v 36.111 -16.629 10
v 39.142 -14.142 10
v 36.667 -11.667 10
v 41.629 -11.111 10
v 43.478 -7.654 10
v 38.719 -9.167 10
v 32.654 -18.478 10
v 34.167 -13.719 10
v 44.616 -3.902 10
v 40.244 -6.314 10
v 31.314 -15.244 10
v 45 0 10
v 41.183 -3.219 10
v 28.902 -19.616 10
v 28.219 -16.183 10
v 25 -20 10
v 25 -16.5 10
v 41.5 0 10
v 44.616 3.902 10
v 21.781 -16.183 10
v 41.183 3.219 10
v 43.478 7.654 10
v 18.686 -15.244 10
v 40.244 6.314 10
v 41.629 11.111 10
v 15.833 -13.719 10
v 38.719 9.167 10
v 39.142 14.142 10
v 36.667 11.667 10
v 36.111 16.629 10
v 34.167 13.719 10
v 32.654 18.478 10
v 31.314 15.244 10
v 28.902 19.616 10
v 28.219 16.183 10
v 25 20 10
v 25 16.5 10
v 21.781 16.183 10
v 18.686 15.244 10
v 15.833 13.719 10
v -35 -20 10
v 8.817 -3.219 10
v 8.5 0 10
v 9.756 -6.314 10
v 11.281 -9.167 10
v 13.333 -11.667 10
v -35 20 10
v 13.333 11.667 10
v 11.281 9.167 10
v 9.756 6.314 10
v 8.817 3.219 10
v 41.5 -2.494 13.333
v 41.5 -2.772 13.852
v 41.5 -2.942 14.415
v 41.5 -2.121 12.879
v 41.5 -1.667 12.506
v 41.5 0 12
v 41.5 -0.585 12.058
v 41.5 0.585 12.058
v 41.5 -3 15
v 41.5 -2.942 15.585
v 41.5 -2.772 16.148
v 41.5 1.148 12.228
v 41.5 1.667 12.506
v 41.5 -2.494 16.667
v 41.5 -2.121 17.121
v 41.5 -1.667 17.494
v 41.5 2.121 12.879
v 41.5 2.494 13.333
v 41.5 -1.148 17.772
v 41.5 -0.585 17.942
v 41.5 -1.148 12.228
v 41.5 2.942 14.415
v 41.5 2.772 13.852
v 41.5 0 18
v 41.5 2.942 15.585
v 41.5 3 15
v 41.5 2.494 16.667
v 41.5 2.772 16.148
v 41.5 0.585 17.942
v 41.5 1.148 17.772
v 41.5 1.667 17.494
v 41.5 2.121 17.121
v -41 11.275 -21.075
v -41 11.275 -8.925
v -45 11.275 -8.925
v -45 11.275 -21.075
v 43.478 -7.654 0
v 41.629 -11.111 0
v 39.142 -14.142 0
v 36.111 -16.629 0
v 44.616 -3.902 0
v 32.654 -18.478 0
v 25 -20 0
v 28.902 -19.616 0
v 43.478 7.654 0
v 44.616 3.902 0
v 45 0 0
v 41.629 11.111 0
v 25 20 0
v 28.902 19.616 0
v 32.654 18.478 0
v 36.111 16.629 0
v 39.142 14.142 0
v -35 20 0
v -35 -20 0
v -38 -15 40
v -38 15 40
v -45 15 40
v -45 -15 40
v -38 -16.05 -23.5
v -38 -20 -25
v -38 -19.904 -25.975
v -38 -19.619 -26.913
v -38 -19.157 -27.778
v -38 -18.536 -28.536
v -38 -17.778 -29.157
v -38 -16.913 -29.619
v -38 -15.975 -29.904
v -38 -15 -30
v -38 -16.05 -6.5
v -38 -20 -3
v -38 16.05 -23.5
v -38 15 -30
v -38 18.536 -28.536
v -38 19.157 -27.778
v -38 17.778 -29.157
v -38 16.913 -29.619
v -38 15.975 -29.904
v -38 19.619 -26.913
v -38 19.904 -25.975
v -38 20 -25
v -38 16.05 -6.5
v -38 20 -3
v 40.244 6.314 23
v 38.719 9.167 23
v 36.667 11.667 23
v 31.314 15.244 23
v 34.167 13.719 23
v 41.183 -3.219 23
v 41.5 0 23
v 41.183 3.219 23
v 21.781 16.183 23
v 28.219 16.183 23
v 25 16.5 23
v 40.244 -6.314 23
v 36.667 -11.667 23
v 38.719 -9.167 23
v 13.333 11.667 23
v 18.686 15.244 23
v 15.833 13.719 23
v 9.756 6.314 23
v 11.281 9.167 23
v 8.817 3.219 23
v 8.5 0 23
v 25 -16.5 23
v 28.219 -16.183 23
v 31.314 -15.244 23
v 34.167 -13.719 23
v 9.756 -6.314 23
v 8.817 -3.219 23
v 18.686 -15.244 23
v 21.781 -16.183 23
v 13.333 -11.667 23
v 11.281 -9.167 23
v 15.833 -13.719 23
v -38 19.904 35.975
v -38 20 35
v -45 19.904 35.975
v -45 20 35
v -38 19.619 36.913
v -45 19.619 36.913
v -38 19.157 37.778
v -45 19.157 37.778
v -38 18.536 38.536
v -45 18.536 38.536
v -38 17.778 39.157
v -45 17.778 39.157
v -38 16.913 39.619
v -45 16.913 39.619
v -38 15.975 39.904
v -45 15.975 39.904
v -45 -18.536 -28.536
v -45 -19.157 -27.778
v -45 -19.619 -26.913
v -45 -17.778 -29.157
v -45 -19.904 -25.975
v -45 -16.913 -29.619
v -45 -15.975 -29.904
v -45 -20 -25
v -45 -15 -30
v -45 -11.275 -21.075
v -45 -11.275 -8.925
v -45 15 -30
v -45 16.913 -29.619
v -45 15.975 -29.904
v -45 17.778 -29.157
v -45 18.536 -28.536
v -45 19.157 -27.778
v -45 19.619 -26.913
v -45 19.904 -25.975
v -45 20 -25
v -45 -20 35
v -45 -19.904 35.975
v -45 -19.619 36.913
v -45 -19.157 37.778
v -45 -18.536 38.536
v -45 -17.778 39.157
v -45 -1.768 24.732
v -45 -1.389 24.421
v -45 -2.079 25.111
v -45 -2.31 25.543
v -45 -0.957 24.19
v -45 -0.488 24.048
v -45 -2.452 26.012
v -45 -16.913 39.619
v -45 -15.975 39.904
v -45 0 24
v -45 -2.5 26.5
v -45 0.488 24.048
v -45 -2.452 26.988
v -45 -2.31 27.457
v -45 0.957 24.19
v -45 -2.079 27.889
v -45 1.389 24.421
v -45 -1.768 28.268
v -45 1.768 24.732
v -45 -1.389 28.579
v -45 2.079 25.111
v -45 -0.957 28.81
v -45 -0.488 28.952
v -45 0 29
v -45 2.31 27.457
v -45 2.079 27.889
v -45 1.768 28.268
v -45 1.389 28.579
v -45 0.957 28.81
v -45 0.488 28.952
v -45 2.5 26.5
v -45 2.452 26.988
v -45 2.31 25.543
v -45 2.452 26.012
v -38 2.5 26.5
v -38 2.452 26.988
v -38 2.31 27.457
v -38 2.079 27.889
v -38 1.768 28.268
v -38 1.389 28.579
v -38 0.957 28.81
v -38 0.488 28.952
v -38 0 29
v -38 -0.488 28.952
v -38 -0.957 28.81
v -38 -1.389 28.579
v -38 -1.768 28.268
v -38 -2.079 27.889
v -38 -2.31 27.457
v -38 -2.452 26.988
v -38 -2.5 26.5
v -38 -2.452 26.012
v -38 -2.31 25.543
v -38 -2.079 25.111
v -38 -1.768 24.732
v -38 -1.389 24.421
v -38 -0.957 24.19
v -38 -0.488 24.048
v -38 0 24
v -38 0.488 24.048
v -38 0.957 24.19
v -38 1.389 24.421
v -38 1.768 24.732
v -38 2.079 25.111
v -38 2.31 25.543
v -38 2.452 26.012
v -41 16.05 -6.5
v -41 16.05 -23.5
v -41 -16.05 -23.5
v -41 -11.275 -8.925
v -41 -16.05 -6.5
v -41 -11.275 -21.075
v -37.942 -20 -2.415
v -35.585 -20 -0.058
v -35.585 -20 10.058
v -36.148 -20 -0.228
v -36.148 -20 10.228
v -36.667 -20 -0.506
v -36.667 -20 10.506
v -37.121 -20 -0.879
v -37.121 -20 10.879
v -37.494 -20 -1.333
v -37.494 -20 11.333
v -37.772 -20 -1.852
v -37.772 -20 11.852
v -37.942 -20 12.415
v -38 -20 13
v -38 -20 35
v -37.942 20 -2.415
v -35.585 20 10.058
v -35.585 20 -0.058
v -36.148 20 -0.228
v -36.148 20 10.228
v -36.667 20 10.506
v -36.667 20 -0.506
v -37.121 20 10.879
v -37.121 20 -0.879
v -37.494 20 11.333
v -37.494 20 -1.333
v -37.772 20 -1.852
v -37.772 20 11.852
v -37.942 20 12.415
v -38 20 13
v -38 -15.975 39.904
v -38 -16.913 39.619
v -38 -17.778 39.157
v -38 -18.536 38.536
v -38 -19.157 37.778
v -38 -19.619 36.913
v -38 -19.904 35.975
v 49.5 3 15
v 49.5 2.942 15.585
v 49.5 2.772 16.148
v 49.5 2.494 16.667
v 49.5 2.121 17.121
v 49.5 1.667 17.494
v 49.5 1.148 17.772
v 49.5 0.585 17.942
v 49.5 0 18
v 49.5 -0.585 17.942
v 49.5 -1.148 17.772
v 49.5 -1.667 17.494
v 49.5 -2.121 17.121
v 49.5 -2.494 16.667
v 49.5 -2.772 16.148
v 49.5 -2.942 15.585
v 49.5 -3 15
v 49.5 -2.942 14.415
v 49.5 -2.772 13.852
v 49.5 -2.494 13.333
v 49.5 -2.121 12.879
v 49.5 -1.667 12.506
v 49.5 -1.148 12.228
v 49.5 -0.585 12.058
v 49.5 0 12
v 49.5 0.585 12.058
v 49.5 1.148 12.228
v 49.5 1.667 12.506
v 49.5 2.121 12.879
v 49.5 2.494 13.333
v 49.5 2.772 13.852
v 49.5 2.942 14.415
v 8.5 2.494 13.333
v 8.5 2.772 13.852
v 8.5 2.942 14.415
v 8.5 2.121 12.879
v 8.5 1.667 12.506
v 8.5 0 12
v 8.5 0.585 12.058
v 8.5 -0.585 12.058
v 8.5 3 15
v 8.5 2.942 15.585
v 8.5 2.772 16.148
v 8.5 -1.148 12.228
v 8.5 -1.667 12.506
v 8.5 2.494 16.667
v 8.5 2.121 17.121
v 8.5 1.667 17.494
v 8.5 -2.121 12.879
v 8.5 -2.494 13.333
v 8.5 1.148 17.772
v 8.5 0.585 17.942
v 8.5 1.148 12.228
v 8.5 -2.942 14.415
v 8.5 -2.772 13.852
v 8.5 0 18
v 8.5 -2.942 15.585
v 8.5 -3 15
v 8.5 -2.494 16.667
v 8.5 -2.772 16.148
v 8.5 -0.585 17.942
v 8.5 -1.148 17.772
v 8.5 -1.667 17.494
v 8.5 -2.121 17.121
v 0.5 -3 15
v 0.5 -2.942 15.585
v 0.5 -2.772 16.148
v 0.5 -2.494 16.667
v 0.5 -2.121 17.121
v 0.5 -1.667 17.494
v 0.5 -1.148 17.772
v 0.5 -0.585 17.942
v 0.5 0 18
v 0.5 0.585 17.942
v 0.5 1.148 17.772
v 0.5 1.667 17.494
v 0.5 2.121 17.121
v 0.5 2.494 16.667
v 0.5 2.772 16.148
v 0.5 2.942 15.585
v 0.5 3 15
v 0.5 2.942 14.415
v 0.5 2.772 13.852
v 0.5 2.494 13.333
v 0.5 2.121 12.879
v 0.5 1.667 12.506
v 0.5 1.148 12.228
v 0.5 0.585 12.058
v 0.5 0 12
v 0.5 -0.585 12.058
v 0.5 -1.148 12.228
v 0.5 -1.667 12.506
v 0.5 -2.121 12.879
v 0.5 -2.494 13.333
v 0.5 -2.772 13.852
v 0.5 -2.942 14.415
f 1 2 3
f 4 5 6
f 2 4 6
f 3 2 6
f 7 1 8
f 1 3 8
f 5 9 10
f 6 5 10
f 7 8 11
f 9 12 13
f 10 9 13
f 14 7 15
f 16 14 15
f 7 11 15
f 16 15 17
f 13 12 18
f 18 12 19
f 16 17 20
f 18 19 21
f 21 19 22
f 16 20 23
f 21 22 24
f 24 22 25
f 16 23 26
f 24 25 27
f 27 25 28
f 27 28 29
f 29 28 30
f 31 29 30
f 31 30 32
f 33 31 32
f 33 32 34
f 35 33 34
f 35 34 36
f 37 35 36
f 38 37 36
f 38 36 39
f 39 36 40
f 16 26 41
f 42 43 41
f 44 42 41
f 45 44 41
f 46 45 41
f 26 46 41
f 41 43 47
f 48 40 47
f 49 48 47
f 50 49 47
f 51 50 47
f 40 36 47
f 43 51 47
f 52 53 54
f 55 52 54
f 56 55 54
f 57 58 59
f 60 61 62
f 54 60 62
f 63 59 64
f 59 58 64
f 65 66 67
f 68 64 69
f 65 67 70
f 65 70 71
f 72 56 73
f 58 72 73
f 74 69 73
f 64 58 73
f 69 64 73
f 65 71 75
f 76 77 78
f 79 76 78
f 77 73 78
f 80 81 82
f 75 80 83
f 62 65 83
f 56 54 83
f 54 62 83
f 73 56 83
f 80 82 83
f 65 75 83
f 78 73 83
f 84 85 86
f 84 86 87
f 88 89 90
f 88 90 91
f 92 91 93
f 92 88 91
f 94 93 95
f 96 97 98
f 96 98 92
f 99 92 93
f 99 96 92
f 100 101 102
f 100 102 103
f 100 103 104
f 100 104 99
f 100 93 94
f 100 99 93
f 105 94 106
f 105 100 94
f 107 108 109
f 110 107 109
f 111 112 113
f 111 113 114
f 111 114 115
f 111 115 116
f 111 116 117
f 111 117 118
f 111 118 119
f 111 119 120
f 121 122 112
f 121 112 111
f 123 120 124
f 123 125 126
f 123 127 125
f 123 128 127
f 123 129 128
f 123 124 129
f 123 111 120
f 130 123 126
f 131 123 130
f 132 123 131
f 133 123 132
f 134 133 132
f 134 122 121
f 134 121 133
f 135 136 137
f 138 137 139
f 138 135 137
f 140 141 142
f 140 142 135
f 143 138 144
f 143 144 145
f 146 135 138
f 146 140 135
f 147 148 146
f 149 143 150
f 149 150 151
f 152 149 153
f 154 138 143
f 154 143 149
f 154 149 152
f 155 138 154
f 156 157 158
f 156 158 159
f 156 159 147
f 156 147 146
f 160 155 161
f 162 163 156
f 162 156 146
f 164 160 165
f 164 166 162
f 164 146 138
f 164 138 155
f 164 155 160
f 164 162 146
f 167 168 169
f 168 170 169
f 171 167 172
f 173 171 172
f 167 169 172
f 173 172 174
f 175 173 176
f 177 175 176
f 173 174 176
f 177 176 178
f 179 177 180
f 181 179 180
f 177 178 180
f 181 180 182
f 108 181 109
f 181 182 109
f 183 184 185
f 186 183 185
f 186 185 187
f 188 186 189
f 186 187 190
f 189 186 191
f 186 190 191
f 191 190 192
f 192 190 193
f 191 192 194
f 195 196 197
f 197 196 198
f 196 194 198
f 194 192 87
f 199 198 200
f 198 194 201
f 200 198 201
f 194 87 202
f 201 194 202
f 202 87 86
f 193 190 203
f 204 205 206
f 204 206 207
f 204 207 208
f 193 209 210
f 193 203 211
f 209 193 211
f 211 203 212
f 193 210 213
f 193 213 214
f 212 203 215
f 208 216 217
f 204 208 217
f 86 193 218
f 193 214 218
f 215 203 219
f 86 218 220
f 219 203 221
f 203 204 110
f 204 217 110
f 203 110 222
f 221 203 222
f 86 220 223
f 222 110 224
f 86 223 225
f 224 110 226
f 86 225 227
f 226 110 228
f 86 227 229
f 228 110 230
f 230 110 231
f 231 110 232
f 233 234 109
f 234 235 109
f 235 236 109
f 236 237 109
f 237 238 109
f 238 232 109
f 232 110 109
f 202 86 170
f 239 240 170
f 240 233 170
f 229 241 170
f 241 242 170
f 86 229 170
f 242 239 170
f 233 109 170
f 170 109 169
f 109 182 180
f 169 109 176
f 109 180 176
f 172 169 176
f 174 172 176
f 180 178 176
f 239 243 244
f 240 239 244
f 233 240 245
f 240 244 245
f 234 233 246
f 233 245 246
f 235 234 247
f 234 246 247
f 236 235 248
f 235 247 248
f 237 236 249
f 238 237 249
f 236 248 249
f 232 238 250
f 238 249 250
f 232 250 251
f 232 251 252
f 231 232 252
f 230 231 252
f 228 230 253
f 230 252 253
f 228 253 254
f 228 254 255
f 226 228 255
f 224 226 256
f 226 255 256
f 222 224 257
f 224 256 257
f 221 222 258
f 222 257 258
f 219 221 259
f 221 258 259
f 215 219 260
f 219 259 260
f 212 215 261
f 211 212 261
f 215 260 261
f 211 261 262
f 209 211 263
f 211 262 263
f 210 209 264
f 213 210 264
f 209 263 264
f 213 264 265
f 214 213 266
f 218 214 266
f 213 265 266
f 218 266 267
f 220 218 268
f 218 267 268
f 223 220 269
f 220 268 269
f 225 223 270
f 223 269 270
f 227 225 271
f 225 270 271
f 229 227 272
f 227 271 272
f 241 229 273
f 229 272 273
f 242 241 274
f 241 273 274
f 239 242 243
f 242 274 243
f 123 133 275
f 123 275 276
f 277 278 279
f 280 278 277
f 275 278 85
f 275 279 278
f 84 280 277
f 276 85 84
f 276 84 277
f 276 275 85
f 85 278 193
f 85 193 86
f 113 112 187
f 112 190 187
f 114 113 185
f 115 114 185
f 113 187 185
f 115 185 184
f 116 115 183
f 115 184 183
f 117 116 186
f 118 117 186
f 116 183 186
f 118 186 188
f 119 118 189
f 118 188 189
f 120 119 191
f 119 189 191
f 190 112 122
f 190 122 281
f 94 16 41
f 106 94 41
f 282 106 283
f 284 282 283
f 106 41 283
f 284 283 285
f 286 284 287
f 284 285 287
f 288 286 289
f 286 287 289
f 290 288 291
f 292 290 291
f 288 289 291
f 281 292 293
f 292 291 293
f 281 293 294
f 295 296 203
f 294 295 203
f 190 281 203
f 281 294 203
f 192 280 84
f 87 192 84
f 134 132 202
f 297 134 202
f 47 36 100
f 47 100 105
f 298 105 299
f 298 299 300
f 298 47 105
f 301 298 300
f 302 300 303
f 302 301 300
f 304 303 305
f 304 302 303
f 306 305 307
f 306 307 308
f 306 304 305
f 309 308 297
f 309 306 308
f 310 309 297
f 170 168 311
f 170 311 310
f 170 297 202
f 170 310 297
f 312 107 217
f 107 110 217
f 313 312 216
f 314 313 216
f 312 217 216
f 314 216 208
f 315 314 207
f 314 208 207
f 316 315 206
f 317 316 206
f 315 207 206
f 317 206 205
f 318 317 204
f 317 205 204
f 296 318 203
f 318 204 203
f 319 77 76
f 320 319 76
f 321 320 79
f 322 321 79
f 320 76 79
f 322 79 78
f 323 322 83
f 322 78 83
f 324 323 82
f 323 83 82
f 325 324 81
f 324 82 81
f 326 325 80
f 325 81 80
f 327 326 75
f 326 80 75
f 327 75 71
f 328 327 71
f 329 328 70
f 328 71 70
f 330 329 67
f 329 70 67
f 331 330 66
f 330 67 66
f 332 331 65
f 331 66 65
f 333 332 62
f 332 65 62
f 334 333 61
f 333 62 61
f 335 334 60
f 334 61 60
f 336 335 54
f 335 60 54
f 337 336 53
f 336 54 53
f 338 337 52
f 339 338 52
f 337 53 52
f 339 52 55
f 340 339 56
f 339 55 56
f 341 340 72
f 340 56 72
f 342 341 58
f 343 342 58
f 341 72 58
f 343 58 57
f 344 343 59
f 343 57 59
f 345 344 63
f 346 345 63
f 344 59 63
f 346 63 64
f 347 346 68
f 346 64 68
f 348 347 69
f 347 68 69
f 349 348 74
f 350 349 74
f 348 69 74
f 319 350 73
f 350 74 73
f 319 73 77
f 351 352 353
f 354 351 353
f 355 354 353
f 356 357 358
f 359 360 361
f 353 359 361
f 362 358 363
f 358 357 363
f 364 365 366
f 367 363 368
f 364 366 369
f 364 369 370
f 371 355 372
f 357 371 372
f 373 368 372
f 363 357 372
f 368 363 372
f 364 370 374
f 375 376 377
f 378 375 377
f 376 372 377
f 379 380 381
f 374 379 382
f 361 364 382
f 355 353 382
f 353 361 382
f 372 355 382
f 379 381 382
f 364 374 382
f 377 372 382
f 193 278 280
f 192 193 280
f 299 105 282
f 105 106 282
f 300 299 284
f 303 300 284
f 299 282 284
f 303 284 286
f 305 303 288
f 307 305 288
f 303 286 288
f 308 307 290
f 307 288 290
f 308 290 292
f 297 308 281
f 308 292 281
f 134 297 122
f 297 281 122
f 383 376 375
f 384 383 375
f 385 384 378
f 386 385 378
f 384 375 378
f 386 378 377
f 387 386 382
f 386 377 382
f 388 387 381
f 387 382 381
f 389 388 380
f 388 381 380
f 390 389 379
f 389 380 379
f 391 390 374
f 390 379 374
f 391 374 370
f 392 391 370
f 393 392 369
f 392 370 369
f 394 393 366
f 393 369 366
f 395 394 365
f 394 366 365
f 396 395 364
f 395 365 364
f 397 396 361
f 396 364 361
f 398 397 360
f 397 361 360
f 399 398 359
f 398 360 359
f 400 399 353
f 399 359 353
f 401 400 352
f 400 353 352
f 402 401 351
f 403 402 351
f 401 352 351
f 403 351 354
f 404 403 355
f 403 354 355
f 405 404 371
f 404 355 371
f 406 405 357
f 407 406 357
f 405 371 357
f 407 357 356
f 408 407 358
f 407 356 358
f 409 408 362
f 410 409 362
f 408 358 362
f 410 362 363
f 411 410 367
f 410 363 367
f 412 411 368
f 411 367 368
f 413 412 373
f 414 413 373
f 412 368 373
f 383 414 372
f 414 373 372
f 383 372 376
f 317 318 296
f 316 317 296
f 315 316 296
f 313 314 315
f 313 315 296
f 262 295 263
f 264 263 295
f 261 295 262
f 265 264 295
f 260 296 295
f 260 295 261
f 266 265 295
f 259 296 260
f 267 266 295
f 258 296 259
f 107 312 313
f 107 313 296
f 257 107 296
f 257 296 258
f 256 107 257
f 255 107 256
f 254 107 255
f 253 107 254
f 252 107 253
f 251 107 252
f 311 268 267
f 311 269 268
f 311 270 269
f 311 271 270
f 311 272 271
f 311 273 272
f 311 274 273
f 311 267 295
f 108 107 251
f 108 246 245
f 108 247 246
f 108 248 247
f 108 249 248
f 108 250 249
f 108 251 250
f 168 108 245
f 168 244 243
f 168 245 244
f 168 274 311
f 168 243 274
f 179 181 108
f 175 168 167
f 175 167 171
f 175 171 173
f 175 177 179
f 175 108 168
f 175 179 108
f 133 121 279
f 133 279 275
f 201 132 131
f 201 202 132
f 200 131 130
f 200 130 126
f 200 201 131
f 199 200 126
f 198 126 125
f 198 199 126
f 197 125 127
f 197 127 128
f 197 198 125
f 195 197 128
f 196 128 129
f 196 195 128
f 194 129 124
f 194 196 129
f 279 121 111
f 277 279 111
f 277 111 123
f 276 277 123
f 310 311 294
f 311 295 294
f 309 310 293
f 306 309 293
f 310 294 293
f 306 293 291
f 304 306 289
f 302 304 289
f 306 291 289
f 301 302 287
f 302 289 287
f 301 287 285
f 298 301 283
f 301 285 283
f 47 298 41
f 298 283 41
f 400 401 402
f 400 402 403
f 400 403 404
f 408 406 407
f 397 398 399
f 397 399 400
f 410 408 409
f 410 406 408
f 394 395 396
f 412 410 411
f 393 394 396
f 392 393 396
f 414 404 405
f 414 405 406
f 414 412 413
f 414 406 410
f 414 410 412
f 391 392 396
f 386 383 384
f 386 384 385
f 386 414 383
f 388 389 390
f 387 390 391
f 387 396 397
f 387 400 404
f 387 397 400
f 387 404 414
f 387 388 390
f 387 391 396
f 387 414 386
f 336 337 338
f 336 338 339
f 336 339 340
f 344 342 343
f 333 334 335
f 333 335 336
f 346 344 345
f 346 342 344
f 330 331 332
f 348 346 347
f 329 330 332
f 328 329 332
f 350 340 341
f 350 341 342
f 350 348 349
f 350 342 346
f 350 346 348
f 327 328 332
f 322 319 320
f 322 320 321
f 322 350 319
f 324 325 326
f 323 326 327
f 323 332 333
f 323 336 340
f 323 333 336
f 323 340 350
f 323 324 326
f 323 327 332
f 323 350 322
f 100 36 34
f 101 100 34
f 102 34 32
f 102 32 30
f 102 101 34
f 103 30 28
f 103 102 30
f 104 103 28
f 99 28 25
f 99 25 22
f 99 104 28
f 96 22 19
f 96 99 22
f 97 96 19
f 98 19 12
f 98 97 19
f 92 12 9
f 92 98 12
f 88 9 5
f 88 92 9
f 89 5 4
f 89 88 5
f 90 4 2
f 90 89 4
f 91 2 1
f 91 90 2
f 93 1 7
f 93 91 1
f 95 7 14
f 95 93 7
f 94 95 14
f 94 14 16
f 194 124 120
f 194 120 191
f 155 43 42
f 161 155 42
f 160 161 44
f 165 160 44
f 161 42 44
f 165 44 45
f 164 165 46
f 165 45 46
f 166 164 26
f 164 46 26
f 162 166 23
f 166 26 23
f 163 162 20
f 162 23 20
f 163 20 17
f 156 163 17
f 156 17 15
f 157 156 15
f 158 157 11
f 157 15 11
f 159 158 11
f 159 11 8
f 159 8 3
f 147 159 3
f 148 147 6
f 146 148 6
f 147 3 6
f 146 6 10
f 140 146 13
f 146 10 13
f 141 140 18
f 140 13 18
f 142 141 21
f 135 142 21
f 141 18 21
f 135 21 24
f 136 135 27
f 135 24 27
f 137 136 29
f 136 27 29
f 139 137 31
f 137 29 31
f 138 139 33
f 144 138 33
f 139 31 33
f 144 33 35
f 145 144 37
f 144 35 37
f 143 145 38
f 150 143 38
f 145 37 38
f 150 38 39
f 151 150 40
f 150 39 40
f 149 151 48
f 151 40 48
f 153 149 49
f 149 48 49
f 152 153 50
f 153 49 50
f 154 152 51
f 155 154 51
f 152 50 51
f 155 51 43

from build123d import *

# Parameters (mm, degrees)
BOSS_EXTRUDE1_DEPTH      = 10
BOSS_EXTRUDE2_DEPTH      = 30
BOSS_EXTRUDE2_DEPTH_BACK = 40
SKETCH2_W                = 7
SKETCH2_H                = 40
SKETCH3_R                = 16.5
BOSS_EXTRUDE3_DEPTH      = 13
SKETCH4_W                = 12.15
SKETCH4_H                = 22.55
CUT_EXTRUDE1_DEPTH       = 10
SKETCH4_3_W              = 17
SKETCH4_3_H              = 32.1
CUT_EXTRUDE2_DEPTH       = 3
FILLET1_R                = 3
FILLET2_R                = 5
SKETCH5_R                = 3
BOSS_EXTRUDE4_DEPTH      = 8
CIRPATTERN3_COUNT        = 2
CIRPATTERN3_ANGLE        = 180
SKETCH6_R                = 2.5
CUT_EXTRUDE3_DEPTH       = 7


with BuildPart() as part:
    # Sketch1 → Boss-Extrude1 (new body)
    with BuildSketch(Plane.XY):
        with BuildLine():
            Line((-45, 20), (25, 20))
            ThreePointArc((25, 20), (45, 0), (25, -20))
            Line((25, -20), (-45, -20))
            Line((-45, -20), (-45, 20))
        make_face()
    extrude(amount=BOSS_EXTRUDE1_DEPTH)

    # Sketch2 → Boss-Extrude2 (add, two sides: drawn at the far end of the back side and taken through both)
    with BuildSketch(Plane(origin=(0, 0, 0), x_dir=(-1, 0, 0), z_dir=(0, 0, -1)).offset(-BOSS_EXTRUDE2_DEPTH_BACK)):
        with Locations((41.5, 0)):
            Rectangle(SKETCH2_W, SKETCH2_H)
    extrude(amount=BOSS_EXTRUDE2_DEPTH + BOSS_EXTRUDE2_DEPTH_BACK)

    # Sketch3 → Boss-Extrude3 (add)
    with BuildSketch(Plane.XY.offset(10)):
        with Locations((25, 0)):
            Circle(SKETCH3_R)
    extrude(amount=BOSS_EXTRUDE3_DEPTH)

    # Sketch4 → Cut-Extrude1 (cut)
    with BuildSketch(Plane(origin=(-38, 0, 0), x_dir=(0, 0, -1), z_dir=(1, 0, 0))):
        with Locations((15, 0)):
            Rectangle(SKETCH4_W, SKETCH4_H)
    extrude(amount=-CUT_EXTRUDE1_DEPTH, mode=Mode.SUBTRACT)

    # Sketch4<3> → Cut-Extrude2 (cut)
    with BuildSketch(Plane(origin=(-38, 0, 0), x_dir=(0, 0, -1), z_dir=(1, 0, 0))):
        with Locations((15, 0)):
            Rectangle(SKETCH4_3_W, SKETCH4_3_H)
    extrude(amount=-CUT_EXTRUDE2_DEPTH, mode=Mode.SUBTRACT)

    # Fillet1
    fillet1_edges = [part.edges().sort_by_distance(p)[0] for p in [
        (-38, 0, 10),
        (-38, 0, 0),
    ]]
    fillet(fillet1_edges, radius=FILLET1_R)

    # Fillet2
    fillet2_edges = [part.edges().sort_by_distance(p)[0] for p in [
        (-41.5, -20, 40),
        (-41.5, 20, 40),
        (-41.5, -20, -30),
        (-41.5, 20, -30),
    ]]
    fillet(fillet2_edges, radius=FILLET2_R)

    # Sketch6 → Cut-Extrude3 (cut)
    with BuildSketch(Plane(origin=(-38, 0, 0), x_dir=(0, 0, -1), z_dir=(1, 0, 0))):
        with Locations((-26.5, 0)):
            Circle(SKETCH6_R)
    extrude(amount=-CUT_EXTRUDE3_DEPTH, mode=Mode.SUBTRACT)


with BuildPart() as body_2:
    # Sketch5 → Boss-Extrude4 (new body)
    with BuildSketch(Plane(origin=(41.5, 0, 0), x_dir=(0, 0, -1), z_dir=(1, 0, 0))):
        with Locations((-15, 0)):
            Circle(SKETCH5_R)
    extrude(amount=BOSS_EXTRUDE4_DEPTH)


with BuildPart() as cirpattern3_1:
    # CirPattern3: pattern copy
    add(body_2.part.rotate(Axis((25, 0, 23), (0, 0, -1)), 1 * CIRPATTERN3_ANGLE / (CIRPATTERN3_COUNT - 1)))


solid = Compound([part.part, body_2.part, cirpattern3_1.part])
